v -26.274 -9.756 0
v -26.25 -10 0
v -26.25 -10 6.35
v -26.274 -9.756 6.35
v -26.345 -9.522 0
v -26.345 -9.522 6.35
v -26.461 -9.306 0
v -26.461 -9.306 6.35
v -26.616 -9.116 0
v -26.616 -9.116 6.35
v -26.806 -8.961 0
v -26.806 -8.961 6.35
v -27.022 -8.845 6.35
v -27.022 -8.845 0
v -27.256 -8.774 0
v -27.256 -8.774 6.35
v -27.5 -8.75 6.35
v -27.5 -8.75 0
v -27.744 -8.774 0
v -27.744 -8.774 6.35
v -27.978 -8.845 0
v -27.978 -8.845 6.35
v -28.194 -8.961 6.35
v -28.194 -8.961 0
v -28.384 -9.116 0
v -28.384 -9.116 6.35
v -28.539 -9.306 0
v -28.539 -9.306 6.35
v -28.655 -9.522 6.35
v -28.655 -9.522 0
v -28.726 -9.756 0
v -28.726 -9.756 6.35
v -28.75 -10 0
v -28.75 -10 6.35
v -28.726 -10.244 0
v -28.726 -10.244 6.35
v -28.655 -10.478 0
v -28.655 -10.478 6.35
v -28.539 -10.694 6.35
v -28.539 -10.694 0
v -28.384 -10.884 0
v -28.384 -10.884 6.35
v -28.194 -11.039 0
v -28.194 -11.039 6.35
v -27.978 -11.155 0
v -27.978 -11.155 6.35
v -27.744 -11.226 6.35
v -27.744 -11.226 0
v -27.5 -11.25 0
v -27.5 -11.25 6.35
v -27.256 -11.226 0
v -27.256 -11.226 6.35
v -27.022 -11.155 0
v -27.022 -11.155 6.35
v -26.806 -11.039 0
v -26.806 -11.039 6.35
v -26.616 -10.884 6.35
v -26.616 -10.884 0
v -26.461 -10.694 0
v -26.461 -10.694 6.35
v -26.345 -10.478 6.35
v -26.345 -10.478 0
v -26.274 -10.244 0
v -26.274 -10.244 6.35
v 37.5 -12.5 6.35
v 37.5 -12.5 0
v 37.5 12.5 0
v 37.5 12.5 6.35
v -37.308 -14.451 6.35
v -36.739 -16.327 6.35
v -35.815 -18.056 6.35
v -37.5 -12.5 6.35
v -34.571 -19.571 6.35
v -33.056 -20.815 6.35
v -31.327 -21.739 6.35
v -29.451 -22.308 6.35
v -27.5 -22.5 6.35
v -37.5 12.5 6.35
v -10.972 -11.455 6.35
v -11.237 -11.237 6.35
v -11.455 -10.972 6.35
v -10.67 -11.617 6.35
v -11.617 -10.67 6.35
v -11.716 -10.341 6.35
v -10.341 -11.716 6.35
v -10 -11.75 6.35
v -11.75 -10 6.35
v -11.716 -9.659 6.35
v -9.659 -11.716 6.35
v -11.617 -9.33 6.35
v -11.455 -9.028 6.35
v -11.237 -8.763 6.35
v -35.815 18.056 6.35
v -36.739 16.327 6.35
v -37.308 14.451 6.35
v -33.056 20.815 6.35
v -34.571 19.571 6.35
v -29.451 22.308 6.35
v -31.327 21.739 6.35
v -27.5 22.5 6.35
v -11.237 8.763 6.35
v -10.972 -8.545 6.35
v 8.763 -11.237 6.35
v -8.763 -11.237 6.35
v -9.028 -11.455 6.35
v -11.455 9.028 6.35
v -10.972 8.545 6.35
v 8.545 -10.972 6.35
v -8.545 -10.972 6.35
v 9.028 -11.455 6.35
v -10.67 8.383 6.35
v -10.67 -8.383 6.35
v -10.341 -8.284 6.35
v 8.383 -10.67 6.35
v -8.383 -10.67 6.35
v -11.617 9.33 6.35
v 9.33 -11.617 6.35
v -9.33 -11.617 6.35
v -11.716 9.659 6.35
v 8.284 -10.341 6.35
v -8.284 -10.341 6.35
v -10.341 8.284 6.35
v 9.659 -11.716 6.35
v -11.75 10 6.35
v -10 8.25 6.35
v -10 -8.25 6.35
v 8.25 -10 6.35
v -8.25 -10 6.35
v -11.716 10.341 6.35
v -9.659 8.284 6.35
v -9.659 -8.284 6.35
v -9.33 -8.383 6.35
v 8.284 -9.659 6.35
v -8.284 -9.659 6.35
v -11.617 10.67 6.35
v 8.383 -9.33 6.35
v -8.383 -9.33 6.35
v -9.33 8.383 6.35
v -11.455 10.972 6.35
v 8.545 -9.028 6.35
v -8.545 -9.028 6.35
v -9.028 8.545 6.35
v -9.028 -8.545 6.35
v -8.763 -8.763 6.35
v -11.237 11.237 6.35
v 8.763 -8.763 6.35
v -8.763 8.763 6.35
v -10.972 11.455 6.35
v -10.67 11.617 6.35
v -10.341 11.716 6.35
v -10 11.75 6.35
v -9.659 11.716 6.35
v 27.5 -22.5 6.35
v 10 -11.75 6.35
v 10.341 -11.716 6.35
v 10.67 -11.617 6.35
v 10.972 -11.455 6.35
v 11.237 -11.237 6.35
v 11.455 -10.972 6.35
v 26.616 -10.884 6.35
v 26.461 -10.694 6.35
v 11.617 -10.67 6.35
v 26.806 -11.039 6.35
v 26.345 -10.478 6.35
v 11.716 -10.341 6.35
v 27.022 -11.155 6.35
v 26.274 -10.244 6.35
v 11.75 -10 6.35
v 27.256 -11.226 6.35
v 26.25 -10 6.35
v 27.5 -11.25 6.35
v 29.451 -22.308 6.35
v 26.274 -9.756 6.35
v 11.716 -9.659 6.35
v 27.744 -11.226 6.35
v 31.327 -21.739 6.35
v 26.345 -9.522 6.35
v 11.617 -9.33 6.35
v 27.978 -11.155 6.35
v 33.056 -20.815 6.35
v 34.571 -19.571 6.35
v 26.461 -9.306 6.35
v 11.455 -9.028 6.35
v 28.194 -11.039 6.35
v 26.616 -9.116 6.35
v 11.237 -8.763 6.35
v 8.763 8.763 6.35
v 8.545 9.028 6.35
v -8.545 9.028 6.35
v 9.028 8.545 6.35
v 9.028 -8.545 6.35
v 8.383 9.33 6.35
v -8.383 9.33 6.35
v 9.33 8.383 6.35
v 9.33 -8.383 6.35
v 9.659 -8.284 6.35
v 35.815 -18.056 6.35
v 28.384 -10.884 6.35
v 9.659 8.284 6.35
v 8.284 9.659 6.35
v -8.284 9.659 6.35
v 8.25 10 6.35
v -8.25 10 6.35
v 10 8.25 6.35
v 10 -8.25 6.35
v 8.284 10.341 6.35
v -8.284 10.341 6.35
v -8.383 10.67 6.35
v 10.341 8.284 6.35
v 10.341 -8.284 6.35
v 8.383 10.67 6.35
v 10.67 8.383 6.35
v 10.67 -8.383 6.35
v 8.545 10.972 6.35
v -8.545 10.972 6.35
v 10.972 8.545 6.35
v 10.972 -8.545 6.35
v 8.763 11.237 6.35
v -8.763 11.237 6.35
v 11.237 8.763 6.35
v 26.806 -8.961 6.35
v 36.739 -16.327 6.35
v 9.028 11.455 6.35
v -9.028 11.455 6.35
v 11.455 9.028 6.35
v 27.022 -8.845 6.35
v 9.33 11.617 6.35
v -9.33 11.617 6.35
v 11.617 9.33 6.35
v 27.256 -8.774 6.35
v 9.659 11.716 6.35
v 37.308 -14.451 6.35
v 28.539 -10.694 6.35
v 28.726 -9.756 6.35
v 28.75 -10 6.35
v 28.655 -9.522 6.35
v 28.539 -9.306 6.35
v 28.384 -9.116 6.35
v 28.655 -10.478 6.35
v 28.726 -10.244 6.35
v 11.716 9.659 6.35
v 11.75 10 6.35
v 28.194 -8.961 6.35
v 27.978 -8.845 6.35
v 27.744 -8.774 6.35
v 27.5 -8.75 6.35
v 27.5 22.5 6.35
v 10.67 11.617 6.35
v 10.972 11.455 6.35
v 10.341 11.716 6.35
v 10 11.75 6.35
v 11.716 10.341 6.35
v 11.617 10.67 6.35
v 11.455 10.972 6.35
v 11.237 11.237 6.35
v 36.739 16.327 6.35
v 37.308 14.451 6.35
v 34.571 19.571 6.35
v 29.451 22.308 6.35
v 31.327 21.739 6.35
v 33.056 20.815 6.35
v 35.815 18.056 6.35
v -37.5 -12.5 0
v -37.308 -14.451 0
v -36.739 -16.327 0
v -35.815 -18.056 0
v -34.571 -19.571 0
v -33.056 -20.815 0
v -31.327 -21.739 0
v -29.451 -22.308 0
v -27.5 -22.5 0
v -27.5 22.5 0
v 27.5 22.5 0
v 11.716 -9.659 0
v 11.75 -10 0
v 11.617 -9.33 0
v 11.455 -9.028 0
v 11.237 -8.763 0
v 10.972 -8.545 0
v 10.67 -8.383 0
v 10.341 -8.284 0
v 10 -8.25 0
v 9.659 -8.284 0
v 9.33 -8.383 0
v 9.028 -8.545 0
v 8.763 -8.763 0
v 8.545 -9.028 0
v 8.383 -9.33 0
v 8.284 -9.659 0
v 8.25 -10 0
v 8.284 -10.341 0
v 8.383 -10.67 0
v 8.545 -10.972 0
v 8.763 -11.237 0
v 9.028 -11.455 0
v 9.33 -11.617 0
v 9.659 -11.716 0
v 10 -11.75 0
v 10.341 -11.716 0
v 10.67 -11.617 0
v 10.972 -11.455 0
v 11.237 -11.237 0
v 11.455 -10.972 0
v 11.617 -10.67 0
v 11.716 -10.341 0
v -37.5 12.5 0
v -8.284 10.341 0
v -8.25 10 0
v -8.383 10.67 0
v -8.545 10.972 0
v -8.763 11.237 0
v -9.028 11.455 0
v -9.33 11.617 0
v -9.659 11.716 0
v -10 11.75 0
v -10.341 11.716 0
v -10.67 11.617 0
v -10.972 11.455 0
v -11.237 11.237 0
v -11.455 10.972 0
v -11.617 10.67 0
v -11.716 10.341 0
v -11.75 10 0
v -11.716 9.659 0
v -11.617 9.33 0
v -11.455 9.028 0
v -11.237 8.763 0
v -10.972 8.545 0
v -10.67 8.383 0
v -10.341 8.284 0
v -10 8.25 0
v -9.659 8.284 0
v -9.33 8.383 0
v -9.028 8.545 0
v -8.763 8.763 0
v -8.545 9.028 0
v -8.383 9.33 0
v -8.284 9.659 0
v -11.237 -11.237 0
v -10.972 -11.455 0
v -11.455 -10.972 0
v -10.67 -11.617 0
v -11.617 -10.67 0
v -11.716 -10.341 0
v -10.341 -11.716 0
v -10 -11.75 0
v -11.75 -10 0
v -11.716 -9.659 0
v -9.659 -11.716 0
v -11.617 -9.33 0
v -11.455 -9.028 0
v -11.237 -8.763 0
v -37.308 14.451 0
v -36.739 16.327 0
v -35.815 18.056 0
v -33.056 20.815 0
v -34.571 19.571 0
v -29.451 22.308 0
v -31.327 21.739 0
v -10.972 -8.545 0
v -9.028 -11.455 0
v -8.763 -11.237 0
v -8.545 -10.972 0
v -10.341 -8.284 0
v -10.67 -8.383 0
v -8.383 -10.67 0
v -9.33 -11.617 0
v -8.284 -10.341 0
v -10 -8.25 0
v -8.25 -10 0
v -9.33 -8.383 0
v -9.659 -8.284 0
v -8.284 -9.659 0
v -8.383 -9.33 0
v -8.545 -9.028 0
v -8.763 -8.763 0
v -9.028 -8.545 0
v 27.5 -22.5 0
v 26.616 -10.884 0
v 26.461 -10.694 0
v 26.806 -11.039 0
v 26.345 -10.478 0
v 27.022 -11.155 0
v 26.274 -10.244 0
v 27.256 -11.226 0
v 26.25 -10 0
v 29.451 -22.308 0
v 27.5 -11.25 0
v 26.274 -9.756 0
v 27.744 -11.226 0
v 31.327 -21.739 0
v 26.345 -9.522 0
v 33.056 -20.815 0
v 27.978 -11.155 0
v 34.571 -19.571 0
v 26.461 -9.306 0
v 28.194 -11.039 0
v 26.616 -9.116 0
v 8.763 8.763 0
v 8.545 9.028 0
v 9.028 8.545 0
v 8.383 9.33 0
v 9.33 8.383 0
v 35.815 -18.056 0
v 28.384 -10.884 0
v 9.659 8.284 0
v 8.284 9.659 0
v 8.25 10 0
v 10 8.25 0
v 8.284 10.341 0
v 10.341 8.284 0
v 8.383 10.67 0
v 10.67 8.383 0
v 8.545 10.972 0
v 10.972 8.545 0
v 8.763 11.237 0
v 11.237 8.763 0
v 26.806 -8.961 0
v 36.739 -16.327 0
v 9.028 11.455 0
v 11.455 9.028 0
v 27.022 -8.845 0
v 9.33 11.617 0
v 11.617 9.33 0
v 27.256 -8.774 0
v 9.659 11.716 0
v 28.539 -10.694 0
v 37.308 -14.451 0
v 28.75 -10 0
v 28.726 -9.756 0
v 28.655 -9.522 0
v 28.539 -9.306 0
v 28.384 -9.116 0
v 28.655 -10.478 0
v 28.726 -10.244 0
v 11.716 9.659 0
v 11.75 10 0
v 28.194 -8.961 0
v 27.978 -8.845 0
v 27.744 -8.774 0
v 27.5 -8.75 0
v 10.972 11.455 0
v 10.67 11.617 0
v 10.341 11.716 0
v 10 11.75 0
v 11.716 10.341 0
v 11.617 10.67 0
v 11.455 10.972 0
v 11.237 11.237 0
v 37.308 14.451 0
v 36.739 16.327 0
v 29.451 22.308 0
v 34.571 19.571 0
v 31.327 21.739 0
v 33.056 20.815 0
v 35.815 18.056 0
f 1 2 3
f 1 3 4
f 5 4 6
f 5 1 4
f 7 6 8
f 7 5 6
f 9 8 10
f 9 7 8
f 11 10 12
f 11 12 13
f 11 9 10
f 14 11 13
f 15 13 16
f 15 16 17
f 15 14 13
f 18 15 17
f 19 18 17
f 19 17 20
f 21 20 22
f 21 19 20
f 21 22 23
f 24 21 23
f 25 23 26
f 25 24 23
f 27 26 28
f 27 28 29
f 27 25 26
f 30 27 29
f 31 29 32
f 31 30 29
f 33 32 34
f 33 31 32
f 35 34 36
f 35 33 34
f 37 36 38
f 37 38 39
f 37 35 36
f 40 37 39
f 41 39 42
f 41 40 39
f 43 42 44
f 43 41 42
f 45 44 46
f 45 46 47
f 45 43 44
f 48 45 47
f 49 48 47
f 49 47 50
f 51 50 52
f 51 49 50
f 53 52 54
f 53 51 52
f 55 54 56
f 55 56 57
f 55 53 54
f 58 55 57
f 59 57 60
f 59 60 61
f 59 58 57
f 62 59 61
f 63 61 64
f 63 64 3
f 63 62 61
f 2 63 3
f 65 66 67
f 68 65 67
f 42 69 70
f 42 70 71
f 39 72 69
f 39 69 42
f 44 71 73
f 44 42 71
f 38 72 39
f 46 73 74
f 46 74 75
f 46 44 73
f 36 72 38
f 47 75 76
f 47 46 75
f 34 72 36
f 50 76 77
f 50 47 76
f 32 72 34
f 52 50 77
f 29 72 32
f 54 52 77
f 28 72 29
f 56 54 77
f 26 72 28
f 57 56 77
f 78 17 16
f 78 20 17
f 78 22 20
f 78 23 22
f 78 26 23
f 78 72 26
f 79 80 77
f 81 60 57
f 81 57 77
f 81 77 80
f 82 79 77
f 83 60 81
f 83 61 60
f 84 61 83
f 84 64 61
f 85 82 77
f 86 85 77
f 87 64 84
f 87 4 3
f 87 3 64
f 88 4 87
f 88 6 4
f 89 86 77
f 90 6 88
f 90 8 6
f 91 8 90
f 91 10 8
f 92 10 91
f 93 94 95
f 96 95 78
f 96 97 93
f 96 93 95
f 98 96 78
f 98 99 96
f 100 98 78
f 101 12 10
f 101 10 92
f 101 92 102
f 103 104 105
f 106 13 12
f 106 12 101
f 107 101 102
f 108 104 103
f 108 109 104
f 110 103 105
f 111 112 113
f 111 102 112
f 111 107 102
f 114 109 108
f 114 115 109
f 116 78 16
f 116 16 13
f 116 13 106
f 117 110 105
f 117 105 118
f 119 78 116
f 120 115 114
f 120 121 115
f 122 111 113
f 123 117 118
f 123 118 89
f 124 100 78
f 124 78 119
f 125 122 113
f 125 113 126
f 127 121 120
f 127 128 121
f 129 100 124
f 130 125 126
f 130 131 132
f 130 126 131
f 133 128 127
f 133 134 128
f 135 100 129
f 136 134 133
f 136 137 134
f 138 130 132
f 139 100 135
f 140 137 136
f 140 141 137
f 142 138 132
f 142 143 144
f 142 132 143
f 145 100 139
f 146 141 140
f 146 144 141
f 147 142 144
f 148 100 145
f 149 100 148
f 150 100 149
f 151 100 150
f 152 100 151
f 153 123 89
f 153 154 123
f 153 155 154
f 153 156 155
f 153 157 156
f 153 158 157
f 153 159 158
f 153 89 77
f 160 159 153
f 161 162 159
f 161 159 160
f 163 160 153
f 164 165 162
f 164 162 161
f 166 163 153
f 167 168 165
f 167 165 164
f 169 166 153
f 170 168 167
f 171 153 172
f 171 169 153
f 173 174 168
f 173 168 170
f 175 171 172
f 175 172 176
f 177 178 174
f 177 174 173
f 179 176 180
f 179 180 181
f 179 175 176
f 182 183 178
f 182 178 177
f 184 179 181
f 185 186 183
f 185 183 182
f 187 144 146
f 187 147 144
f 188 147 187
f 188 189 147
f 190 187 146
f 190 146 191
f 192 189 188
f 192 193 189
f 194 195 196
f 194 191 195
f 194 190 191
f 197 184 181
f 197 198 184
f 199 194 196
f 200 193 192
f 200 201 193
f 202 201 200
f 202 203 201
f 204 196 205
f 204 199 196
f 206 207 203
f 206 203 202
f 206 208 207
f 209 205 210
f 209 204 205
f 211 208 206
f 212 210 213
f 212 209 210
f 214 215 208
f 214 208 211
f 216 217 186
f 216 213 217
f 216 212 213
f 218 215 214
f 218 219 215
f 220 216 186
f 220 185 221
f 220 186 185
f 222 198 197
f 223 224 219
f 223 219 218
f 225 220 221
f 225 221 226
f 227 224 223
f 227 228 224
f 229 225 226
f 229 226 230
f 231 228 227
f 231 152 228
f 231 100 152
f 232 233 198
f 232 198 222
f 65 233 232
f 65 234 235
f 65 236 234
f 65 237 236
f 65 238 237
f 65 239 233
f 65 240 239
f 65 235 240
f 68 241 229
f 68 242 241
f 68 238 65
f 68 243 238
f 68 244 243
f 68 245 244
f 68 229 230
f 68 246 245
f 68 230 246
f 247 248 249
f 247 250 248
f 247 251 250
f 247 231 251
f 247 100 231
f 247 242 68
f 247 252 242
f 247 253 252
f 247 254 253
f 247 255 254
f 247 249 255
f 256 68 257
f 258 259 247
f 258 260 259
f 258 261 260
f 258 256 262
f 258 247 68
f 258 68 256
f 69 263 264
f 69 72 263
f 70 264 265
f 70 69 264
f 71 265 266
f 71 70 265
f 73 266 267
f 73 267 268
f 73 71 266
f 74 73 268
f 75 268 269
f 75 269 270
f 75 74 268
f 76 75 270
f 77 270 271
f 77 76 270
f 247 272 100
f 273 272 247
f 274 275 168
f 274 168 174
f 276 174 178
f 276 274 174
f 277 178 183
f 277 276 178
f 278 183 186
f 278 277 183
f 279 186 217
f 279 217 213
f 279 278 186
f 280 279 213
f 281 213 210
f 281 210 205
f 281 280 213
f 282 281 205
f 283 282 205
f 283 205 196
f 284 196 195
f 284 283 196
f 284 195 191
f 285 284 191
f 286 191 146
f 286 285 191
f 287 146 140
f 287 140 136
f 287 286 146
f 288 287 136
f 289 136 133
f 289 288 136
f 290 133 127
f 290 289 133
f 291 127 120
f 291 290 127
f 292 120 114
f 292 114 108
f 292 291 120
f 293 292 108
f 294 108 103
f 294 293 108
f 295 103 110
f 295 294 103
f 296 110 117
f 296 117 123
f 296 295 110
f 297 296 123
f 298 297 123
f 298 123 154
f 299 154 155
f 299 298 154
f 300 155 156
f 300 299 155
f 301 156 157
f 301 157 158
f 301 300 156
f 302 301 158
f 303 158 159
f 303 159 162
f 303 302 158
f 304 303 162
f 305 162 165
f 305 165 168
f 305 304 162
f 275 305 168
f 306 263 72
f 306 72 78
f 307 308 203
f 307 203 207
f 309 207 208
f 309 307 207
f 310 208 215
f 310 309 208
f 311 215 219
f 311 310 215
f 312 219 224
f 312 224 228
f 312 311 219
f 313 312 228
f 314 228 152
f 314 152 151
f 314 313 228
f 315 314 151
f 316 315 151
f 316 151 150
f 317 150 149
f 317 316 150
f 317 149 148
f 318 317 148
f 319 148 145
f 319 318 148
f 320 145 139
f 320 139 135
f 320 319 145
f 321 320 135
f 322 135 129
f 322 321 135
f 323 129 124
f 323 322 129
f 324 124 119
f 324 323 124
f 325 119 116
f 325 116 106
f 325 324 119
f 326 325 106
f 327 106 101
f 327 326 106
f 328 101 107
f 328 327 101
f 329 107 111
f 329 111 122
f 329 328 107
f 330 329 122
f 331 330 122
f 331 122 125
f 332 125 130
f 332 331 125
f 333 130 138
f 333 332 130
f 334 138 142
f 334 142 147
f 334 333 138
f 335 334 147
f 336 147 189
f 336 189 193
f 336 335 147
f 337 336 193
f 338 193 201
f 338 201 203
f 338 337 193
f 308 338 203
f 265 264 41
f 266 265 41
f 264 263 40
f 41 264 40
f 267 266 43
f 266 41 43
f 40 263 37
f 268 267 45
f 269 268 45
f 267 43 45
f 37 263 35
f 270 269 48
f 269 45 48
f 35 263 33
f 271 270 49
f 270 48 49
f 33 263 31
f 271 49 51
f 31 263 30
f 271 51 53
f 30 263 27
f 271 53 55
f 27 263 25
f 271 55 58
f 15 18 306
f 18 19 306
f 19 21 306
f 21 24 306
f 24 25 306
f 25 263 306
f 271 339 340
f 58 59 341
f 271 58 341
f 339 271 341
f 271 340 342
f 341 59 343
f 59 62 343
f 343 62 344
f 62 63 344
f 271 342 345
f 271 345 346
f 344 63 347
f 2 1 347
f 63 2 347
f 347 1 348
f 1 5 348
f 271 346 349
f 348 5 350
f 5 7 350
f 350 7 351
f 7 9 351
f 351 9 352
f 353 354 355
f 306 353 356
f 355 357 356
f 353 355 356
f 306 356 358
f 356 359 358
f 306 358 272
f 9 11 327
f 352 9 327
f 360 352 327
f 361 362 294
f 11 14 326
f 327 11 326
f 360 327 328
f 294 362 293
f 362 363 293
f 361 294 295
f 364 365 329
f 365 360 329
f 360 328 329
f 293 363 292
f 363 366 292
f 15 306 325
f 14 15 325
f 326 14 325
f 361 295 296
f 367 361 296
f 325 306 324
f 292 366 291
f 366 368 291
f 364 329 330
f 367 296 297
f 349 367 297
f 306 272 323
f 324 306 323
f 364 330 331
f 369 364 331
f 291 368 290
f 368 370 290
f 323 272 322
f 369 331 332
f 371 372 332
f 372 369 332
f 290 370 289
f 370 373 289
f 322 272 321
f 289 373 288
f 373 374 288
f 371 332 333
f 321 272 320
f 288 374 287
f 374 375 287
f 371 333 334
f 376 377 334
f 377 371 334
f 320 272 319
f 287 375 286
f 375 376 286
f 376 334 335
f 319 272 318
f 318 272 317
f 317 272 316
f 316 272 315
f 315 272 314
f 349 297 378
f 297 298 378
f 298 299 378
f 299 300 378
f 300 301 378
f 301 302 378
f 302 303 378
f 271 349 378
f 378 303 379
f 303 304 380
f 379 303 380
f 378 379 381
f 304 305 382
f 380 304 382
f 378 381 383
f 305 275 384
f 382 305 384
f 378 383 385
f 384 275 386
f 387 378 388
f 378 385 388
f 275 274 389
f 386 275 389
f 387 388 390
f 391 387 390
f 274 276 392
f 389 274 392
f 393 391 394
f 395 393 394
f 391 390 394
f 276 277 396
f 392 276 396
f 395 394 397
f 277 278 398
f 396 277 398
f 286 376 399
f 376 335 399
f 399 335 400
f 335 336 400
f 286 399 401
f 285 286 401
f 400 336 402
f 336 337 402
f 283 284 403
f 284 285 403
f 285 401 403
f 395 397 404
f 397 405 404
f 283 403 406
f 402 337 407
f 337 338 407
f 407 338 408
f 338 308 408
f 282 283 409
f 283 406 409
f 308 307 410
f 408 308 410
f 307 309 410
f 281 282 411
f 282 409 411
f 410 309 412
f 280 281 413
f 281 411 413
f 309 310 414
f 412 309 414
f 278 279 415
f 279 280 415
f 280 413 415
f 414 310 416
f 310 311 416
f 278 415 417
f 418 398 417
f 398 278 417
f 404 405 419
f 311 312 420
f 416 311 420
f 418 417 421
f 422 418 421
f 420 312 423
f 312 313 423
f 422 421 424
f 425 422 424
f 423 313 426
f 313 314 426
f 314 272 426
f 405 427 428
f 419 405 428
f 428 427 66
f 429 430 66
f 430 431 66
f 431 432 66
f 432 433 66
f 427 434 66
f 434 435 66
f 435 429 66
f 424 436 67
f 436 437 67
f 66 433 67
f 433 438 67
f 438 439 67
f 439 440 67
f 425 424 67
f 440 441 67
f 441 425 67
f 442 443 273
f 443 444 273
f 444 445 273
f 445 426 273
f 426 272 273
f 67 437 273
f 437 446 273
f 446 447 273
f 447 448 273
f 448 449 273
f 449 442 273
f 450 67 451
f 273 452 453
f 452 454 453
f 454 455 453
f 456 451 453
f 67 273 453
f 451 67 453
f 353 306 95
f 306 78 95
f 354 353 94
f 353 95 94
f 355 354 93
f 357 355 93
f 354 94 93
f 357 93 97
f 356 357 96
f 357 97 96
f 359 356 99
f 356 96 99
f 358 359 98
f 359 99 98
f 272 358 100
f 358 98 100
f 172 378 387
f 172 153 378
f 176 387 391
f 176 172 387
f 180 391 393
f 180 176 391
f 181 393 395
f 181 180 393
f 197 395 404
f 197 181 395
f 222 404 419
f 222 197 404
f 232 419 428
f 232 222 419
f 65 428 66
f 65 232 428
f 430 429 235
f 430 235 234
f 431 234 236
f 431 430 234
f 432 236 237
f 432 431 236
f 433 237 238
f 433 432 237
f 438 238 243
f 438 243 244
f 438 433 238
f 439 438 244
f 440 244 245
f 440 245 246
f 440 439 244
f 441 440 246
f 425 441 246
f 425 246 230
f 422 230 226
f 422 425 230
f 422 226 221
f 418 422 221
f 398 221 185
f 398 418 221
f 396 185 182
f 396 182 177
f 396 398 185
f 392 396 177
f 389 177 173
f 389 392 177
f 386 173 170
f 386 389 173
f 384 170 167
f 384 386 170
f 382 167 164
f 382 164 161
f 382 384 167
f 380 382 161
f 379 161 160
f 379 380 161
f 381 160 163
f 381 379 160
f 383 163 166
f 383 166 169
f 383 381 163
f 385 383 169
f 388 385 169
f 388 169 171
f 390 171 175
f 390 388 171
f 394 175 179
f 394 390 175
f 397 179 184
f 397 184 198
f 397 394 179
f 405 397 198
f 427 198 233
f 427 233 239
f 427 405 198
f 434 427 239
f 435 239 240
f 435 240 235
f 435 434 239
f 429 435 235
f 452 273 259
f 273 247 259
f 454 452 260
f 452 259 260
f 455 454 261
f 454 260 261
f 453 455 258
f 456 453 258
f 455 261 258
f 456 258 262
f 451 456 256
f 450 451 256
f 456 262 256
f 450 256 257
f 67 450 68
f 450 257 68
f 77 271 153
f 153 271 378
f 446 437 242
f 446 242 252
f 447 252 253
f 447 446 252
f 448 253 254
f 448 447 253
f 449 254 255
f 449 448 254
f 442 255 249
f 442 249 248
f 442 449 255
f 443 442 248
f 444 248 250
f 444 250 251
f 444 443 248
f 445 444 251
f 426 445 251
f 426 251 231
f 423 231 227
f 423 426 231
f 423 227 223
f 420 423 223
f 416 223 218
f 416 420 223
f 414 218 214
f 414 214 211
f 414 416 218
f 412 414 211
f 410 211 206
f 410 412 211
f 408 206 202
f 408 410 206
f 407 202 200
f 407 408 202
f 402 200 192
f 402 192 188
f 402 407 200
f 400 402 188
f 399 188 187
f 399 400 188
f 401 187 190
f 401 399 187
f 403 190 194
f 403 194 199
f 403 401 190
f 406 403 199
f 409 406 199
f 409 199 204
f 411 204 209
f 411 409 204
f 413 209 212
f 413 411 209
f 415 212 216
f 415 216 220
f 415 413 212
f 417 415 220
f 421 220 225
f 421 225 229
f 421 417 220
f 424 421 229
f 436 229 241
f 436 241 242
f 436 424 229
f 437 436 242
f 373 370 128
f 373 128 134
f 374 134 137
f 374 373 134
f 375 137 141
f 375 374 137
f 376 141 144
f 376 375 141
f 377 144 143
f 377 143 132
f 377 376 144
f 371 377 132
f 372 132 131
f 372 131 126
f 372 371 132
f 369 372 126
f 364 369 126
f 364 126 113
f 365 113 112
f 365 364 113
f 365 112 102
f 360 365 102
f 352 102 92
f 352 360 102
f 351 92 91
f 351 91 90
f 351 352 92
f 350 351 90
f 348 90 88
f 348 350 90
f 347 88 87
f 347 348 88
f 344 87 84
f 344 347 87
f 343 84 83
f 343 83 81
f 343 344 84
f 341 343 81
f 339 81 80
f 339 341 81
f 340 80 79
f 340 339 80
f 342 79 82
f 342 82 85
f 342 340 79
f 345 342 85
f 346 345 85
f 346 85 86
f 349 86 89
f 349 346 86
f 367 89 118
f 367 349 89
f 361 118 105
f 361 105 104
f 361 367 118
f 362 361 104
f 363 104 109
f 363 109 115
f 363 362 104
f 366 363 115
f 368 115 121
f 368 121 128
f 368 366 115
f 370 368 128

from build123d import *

# Parameters (mm, degrees)
F0_W     = 75
F0_H     = 45
F0_R     = 1.25
F0_R_2   = 1.75
F1_DEPTH = 6.35
F2_R     = 10


with BuildPart() as f1:
    # F0 (on Top) → F1 (new body)
    with BuildSketch(Plane.XY):
        Rectangle(F0_W, F0_H)
        with Locations((-27.5, -10)):
            Circle(F0_R, mode=Mode.SUBTRACT)
        with Locations((-10, -10)):
            Circle(F0_R_2, mode=Mode.SUBTRACT)
        with Locations((10, -10)):
            Circle(F0_R_2, mode=Mode.SUBTRACT)
        with Locations((27.5, -10)):
            Circle(F0_R, mode=Mode.SUBTRACT)
        with Locations((-10, 10)):
            Circle(F0_R_2, mode=Mode.SUBTRACT)
        with Locations((10, 10)):
            Circle(F0_R_2, mode=Mode.SUBTRACT)
    extrude(amount=F1_DEPTH)

    # F2
    f2_edges = [f1.edges().sort_by_distance(p)[0] for p in [
        (-37.5, 22.5, 3.175),
        (37.5, 22.5, 3.175),
        (37.5, -22.5, 3.175),
        (-37.5, -22.5, 3.175),
    ]]
    fillet(f2_edges, radius=F2_R)


solid = f1.part
